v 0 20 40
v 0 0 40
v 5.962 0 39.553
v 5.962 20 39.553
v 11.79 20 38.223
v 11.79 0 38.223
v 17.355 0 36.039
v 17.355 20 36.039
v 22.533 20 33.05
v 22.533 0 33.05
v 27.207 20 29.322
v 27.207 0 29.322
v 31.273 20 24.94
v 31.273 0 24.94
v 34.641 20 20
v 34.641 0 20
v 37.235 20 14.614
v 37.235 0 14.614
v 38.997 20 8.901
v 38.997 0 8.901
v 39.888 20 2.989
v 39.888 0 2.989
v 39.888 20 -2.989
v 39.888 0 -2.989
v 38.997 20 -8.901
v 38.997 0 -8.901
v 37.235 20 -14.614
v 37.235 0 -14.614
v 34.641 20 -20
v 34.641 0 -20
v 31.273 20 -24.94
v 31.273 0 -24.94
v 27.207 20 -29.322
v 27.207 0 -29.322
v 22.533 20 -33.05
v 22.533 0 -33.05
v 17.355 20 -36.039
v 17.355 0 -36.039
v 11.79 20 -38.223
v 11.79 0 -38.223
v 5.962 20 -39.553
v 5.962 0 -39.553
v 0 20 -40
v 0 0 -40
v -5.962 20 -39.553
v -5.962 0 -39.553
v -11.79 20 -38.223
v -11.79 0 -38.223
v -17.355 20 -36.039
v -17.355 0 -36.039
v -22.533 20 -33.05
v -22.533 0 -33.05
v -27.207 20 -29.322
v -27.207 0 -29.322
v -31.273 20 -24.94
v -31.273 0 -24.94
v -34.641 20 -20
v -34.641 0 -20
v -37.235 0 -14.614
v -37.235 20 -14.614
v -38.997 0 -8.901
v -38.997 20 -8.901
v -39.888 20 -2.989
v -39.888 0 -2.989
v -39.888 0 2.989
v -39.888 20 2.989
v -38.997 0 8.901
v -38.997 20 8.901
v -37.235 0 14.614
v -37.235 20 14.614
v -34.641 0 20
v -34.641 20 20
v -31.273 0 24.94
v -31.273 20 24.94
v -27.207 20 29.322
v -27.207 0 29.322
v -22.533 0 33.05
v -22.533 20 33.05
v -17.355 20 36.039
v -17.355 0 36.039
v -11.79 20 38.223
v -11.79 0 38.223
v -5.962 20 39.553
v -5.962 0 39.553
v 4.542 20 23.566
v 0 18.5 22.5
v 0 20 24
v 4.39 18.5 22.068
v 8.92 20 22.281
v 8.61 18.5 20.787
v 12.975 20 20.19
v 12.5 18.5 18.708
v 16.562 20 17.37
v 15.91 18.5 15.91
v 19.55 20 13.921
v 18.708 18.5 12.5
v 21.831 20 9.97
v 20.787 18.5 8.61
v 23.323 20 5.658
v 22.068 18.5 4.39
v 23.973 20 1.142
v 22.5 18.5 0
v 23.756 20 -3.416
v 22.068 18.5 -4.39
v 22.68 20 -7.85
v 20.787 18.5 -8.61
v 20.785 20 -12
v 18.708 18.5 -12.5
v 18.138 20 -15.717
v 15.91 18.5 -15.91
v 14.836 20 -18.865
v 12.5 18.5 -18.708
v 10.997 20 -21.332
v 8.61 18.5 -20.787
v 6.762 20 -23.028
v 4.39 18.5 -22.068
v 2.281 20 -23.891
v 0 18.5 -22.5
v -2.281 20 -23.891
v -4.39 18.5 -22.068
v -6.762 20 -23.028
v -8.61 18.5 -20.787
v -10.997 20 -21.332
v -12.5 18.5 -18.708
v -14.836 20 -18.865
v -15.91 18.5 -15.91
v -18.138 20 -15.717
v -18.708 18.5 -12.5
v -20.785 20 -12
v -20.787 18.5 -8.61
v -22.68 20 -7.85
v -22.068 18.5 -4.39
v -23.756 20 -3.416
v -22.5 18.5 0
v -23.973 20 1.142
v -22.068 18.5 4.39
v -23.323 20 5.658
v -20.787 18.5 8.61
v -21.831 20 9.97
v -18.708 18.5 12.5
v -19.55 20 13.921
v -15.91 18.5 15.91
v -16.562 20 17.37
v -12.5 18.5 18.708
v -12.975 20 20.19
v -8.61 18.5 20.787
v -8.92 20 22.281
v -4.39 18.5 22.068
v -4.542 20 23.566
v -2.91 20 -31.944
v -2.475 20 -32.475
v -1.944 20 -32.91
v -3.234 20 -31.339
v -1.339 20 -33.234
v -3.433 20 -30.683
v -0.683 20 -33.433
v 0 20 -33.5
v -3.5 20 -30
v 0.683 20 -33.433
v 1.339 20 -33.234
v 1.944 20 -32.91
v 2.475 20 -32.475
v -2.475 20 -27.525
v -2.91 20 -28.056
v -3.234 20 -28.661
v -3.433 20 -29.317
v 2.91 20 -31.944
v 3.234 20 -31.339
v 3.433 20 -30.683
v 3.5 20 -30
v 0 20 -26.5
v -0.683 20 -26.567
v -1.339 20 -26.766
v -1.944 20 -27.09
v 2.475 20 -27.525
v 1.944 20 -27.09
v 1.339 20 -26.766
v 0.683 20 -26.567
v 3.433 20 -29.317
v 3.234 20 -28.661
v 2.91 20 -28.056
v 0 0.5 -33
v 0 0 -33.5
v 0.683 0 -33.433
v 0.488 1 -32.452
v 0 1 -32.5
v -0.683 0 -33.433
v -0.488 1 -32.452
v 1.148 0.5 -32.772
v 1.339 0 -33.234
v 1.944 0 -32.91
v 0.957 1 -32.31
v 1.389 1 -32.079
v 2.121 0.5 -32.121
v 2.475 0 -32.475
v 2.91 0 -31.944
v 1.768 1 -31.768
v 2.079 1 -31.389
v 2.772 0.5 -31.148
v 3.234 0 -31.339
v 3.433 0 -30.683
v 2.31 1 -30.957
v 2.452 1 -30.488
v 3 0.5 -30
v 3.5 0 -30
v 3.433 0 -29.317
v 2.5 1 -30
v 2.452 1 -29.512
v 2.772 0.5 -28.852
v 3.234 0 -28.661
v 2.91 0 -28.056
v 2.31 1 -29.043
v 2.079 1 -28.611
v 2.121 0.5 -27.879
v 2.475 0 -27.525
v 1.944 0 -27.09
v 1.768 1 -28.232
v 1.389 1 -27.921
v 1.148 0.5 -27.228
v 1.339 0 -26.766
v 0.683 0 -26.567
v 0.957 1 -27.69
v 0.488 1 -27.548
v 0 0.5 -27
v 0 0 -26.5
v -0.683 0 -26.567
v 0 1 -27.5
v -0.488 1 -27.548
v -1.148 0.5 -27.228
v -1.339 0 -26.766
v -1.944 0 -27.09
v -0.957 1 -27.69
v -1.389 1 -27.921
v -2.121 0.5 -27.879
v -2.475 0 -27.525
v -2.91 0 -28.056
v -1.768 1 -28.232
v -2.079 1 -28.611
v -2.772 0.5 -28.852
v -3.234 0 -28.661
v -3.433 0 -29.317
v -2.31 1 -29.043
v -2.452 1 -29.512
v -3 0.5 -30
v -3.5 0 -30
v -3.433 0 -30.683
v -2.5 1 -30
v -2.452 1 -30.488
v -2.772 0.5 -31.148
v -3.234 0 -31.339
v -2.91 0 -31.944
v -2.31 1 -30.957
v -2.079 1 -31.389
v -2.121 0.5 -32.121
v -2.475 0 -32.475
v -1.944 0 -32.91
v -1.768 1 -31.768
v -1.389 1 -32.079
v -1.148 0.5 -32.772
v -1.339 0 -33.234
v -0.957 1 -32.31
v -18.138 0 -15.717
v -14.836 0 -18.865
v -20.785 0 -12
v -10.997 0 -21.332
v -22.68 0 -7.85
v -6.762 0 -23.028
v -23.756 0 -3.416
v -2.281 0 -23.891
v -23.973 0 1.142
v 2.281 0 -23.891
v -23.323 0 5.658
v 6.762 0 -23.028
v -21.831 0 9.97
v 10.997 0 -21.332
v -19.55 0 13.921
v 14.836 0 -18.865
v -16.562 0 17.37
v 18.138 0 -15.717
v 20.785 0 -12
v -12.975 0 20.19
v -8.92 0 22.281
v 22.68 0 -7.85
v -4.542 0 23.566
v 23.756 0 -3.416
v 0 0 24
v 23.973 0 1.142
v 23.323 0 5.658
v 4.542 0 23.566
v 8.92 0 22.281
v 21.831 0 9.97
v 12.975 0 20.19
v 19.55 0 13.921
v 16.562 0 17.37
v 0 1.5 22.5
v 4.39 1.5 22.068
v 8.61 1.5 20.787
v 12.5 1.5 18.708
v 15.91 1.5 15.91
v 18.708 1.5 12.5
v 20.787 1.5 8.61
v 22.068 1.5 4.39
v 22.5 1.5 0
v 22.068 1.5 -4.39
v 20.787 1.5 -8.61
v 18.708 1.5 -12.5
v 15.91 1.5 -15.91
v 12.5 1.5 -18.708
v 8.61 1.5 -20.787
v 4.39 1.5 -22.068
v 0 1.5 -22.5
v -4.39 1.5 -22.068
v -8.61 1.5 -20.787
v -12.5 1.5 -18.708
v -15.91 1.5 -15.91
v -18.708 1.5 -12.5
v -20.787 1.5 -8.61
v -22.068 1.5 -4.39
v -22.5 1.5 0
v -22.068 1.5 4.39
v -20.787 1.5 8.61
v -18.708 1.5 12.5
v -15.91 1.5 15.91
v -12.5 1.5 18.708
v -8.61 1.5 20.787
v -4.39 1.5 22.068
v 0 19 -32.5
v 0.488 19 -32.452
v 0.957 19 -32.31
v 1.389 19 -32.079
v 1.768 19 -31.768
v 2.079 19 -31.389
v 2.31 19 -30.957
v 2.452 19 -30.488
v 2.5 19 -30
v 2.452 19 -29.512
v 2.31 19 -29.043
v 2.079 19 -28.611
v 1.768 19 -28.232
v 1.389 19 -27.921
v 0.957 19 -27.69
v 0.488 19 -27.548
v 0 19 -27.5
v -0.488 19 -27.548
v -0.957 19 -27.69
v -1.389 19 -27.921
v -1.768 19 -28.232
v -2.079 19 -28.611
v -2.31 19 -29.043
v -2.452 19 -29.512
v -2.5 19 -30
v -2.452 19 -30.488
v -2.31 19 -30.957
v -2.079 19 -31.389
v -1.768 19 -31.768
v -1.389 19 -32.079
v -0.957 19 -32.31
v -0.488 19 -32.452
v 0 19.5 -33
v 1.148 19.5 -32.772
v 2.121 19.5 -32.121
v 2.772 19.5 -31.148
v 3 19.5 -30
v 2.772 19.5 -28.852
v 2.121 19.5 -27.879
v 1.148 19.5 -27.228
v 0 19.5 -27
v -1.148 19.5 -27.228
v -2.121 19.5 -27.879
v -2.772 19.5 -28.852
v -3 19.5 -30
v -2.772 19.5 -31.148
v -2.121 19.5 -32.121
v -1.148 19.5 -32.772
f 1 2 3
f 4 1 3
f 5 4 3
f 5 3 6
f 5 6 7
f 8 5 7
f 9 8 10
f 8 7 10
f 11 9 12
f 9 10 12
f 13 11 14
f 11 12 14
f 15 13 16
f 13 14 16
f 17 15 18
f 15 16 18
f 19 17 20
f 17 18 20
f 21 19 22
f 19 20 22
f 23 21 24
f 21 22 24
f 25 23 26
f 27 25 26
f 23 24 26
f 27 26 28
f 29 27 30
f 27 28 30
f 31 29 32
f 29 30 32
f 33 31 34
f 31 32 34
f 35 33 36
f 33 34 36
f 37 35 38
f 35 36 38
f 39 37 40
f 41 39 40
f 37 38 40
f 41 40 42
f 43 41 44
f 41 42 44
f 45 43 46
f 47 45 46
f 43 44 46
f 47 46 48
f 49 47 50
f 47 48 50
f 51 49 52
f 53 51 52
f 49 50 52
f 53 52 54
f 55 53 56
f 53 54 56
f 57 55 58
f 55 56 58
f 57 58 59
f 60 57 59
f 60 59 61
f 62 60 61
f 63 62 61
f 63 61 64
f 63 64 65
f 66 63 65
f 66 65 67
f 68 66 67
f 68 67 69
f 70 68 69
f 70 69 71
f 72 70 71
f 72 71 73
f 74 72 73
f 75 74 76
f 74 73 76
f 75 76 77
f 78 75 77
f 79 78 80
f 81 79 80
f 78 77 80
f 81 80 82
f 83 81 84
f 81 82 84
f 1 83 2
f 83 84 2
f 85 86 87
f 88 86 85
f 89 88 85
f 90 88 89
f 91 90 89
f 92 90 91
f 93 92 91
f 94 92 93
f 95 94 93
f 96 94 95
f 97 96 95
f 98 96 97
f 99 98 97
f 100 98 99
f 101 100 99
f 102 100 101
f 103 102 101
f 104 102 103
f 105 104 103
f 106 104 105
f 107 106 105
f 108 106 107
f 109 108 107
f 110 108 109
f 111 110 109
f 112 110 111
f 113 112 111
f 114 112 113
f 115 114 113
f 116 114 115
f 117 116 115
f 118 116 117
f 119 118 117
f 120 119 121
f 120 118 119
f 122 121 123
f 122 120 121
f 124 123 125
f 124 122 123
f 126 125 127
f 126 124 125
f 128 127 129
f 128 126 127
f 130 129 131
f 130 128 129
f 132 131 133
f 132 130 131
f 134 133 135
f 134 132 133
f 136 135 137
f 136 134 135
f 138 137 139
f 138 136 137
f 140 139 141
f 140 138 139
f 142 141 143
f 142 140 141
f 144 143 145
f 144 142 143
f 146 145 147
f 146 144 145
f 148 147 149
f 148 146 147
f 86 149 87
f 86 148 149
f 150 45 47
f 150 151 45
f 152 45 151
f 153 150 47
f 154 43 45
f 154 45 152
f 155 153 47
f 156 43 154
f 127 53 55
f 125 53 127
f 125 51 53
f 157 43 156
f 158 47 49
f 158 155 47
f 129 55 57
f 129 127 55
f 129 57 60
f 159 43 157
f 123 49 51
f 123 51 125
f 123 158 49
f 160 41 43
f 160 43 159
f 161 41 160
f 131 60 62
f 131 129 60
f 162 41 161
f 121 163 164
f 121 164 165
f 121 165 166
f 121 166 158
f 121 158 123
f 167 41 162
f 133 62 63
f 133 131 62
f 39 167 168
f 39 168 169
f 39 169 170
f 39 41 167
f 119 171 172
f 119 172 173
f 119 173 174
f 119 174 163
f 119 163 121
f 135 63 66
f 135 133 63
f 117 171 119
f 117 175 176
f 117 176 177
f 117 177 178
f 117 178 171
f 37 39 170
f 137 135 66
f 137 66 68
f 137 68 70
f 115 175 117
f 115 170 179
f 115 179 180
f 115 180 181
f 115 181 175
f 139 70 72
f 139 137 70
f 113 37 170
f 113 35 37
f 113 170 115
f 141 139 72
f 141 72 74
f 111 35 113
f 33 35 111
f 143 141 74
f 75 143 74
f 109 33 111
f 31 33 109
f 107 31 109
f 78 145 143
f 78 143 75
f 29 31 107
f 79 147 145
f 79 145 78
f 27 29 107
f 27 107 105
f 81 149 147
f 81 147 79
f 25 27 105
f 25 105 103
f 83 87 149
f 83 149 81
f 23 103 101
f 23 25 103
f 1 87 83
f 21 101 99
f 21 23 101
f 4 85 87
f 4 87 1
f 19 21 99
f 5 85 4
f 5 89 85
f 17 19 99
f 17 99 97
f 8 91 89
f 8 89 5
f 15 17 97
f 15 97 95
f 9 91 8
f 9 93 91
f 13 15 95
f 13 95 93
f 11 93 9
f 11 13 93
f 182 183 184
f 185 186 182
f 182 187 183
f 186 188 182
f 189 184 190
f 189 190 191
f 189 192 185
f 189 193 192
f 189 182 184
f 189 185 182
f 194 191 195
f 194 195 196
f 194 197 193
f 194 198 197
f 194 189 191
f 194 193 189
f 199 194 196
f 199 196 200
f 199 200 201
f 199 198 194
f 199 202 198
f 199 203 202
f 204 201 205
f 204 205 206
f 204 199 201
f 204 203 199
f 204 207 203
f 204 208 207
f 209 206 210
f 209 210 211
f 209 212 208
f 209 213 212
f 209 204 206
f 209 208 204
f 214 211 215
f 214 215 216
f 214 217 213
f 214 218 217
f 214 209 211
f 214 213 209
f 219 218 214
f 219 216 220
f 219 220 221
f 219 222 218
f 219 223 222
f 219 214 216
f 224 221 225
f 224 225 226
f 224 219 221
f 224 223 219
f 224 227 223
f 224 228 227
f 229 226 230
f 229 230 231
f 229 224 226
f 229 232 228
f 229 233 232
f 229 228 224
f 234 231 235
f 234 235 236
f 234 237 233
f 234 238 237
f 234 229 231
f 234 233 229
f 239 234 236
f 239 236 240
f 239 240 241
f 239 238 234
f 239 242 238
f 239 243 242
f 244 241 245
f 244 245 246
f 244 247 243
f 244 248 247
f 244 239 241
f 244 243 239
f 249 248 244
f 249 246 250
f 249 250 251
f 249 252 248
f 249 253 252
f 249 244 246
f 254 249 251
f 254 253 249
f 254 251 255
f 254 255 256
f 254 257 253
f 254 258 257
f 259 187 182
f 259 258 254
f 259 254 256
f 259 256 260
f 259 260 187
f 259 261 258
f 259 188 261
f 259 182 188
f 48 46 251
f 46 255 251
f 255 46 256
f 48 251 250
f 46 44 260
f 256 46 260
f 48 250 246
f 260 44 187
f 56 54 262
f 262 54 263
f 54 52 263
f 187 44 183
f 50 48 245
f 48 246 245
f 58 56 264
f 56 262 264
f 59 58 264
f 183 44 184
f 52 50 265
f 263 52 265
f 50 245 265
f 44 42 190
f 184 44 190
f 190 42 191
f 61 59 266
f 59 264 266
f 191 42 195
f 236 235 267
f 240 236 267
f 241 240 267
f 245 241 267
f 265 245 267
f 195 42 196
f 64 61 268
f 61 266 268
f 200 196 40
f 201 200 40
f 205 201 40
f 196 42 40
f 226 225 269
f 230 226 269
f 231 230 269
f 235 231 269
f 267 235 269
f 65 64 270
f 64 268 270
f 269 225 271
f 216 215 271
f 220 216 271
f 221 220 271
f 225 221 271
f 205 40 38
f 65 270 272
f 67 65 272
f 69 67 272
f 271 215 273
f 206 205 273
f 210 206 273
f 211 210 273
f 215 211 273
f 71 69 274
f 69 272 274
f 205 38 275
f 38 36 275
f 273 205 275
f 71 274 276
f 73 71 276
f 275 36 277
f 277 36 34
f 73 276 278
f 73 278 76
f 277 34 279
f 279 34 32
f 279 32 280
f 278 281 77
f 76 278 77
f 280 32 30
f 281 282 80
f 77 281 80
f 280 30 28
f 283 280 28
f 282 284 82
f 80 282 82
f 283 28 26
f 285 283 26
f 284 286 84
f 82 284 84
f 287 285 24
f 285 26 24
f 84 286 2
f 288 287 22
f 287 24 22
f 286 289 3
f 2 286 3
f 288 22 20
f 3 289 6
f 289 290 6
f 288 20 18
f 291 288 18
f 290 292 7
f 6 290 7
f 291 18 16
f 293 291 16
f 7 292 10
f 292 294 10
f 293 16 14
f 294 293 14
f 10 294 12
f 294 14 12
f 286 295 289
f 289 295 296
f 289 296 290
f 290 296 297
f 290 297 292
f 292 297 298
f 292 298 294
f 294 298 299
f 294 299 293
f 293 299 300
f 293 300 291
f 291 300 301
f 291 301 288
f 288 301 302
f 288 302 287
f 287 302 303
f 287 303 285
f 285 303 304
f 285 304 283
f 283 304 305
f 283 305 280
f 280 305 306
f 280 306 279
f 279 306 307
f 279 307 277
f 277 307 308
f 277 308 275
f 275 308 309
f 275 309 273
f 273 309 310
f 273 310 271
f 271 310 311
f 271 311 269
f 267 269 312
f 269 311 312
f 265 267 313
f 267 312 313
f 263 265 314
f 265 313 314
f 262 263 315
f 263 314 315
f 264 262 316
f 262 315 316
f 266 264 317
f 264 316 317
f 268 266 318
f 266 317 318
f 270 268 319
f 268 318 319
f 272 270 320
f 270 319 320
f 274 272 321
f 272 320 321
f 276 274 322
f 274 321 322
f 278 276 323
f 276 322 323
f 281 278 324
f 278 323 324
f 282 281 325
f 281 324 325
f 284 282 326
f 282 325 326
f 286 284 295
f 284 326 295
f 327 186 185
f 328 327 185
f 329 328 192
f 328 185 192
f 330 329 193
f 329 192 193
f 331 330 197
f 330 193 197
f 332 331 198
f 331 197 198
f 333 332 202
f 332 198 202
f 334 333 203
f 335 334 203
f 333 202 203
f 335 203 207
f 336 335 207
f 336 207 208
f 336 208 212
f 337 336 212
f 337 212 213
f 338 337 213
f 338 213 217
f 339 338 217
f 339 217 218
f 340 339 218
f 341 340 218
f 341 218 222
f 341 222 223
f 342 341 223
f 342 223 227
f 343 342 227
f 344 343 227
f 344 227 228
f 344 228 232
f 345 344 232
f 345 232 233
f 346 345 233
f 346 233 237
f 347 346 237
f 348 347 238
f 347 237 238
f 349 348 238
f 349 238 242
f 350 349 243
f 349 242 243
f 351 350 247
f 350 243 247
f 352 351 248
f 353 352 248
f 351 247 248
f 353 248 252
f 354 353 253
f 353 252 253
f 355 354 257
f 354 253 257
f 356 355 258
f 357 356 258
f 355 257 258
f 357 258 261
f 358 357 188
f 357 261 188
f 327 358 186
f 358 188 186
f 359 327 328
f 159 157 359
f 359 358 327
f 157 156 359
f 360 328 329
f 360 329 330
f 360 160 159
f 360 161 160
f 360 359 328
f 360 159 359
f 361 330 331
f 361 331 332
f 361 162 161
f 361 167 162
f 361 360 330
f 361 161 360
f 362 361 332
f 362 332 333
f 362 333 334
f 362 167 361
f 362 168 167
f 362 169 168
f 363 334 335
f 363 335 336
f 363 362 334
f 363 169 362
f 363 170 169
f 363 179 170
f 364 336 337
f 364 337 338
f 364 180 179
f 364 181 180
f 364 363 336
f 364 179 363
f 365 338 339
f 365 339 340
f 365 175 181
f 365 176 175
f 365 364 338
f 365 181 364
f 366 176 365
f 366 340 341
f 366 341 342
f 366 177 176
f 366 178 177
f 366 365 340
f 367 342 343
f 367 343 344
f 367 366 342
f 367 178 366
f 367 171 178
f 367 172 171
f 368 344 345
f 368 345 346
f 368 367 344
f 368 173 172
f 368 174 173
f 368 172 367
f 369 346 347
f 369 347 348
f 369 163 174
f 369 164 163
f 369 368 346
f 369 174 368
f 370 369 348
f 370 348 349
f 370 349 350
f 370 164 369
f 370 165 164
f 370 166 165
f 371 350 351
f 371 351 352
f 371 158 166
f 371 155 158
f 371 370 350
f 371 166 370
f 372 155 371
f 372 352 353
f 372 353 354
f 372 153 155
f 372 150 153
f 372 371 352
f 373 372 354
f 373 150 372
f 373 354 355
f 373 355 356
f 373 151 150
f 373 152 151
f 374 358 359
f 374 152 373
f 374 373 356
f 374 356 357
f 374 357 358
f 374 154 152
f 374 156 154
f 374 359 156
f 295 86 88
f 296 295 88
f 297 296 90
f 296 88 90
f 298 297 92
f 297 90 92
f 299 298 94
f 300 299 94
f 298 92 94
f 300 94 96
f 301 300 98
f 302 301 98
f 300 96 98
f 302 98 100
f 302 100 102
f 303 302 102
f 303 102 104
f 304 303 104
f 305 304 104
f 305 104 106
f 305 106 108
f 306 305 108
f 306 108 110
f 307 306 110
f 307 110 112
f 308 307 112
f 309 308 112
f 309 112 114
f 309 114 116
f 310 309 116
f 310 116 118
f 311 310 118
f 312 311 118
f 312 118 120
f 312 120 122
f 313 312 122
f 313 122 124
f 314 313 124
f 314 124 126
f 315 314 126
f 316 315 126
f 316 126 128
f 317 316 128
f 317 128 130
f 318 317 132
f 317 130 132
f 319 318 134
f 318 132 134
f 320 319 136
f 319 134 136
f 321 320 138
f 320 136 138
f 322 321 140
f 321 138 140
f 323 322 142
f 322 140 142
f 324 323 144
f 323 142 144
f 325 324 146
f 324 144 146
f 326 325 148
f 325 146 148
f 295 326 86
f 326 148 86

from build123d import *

# Parameters (mm, degrees)
SKETCH_1_R            = 40
EXTRUDE_1_DEPTH       = 20
SKETCH_2_R            = 22.5
CUT_EXTRUDE_1_DEPTH   = 61
CHAMFER_1_SIZE        = 1.5
SKETCH_3_R            = 2.5
CUT_EXTRUDE_597_DEPTH = 61
CHAMFER_2_SIZE        = 1


with BuildPart() as part:
    # Эскиз1 → Бобышка-Вытянуть1 (new body)
    with BuildSketch(Plane(origin=(0, 0, 0), x_dir=(1, 0, 0), z_dir=(0, 1, 0))):
        with Locations(Location((0, 0, 0), (0, 0, 270))):
            Circle(SKETCH_1_R)
    extrude(amount=EXTRUDE_1_DEPTH)

    # Эскиз2 → Вырез-Вытянуть1 (cut, through all)
    with BuildSketch(Plane(origin=(0, 20, 0), x_dir=(1, 0, 0), z_dir=(0, 1, 0))):
        with Locations(Location((0, 0, 0), (0, 0, 270))):
            Circle(SKETCH_2_R)
    extrude(amount=-CUT_EXTRUDE_1_DEPTH, mode=Mode.SUBTRACT)

    # Фаска1
    chamfer_1_edges = [part.edges().sort_by_distance(p)[0] for p in [
        (0, 0, -22.5),
        (0, 20, -22.5),
    ]]
    chamfer(chamfer_1_edges, length=CHAMFER_1_SIZE)

    # Эскиз3 → Cut-Extrude 597 (cut, through all)
    with BuildSketch(Plane.XZ):
        with Locations(Location((0, -30, 0), (0, 0, 270))):
            Circle(SKETCH_3_R)
    extrude(amount=-CUT_EXTRUDE_597_DEPTH, mode=Mode.SUBTRACT)

    # Фаска2
    chamfer_2_edges = [part.edges().sort_by_distance(p)[0] for p in [
        (0, 20, -27.5),
        (0, 0, -27.5),
    ]]
    chamfer(chamfer_2_edges, length=CHAMFER_2_SIZE)


solid = part.part
